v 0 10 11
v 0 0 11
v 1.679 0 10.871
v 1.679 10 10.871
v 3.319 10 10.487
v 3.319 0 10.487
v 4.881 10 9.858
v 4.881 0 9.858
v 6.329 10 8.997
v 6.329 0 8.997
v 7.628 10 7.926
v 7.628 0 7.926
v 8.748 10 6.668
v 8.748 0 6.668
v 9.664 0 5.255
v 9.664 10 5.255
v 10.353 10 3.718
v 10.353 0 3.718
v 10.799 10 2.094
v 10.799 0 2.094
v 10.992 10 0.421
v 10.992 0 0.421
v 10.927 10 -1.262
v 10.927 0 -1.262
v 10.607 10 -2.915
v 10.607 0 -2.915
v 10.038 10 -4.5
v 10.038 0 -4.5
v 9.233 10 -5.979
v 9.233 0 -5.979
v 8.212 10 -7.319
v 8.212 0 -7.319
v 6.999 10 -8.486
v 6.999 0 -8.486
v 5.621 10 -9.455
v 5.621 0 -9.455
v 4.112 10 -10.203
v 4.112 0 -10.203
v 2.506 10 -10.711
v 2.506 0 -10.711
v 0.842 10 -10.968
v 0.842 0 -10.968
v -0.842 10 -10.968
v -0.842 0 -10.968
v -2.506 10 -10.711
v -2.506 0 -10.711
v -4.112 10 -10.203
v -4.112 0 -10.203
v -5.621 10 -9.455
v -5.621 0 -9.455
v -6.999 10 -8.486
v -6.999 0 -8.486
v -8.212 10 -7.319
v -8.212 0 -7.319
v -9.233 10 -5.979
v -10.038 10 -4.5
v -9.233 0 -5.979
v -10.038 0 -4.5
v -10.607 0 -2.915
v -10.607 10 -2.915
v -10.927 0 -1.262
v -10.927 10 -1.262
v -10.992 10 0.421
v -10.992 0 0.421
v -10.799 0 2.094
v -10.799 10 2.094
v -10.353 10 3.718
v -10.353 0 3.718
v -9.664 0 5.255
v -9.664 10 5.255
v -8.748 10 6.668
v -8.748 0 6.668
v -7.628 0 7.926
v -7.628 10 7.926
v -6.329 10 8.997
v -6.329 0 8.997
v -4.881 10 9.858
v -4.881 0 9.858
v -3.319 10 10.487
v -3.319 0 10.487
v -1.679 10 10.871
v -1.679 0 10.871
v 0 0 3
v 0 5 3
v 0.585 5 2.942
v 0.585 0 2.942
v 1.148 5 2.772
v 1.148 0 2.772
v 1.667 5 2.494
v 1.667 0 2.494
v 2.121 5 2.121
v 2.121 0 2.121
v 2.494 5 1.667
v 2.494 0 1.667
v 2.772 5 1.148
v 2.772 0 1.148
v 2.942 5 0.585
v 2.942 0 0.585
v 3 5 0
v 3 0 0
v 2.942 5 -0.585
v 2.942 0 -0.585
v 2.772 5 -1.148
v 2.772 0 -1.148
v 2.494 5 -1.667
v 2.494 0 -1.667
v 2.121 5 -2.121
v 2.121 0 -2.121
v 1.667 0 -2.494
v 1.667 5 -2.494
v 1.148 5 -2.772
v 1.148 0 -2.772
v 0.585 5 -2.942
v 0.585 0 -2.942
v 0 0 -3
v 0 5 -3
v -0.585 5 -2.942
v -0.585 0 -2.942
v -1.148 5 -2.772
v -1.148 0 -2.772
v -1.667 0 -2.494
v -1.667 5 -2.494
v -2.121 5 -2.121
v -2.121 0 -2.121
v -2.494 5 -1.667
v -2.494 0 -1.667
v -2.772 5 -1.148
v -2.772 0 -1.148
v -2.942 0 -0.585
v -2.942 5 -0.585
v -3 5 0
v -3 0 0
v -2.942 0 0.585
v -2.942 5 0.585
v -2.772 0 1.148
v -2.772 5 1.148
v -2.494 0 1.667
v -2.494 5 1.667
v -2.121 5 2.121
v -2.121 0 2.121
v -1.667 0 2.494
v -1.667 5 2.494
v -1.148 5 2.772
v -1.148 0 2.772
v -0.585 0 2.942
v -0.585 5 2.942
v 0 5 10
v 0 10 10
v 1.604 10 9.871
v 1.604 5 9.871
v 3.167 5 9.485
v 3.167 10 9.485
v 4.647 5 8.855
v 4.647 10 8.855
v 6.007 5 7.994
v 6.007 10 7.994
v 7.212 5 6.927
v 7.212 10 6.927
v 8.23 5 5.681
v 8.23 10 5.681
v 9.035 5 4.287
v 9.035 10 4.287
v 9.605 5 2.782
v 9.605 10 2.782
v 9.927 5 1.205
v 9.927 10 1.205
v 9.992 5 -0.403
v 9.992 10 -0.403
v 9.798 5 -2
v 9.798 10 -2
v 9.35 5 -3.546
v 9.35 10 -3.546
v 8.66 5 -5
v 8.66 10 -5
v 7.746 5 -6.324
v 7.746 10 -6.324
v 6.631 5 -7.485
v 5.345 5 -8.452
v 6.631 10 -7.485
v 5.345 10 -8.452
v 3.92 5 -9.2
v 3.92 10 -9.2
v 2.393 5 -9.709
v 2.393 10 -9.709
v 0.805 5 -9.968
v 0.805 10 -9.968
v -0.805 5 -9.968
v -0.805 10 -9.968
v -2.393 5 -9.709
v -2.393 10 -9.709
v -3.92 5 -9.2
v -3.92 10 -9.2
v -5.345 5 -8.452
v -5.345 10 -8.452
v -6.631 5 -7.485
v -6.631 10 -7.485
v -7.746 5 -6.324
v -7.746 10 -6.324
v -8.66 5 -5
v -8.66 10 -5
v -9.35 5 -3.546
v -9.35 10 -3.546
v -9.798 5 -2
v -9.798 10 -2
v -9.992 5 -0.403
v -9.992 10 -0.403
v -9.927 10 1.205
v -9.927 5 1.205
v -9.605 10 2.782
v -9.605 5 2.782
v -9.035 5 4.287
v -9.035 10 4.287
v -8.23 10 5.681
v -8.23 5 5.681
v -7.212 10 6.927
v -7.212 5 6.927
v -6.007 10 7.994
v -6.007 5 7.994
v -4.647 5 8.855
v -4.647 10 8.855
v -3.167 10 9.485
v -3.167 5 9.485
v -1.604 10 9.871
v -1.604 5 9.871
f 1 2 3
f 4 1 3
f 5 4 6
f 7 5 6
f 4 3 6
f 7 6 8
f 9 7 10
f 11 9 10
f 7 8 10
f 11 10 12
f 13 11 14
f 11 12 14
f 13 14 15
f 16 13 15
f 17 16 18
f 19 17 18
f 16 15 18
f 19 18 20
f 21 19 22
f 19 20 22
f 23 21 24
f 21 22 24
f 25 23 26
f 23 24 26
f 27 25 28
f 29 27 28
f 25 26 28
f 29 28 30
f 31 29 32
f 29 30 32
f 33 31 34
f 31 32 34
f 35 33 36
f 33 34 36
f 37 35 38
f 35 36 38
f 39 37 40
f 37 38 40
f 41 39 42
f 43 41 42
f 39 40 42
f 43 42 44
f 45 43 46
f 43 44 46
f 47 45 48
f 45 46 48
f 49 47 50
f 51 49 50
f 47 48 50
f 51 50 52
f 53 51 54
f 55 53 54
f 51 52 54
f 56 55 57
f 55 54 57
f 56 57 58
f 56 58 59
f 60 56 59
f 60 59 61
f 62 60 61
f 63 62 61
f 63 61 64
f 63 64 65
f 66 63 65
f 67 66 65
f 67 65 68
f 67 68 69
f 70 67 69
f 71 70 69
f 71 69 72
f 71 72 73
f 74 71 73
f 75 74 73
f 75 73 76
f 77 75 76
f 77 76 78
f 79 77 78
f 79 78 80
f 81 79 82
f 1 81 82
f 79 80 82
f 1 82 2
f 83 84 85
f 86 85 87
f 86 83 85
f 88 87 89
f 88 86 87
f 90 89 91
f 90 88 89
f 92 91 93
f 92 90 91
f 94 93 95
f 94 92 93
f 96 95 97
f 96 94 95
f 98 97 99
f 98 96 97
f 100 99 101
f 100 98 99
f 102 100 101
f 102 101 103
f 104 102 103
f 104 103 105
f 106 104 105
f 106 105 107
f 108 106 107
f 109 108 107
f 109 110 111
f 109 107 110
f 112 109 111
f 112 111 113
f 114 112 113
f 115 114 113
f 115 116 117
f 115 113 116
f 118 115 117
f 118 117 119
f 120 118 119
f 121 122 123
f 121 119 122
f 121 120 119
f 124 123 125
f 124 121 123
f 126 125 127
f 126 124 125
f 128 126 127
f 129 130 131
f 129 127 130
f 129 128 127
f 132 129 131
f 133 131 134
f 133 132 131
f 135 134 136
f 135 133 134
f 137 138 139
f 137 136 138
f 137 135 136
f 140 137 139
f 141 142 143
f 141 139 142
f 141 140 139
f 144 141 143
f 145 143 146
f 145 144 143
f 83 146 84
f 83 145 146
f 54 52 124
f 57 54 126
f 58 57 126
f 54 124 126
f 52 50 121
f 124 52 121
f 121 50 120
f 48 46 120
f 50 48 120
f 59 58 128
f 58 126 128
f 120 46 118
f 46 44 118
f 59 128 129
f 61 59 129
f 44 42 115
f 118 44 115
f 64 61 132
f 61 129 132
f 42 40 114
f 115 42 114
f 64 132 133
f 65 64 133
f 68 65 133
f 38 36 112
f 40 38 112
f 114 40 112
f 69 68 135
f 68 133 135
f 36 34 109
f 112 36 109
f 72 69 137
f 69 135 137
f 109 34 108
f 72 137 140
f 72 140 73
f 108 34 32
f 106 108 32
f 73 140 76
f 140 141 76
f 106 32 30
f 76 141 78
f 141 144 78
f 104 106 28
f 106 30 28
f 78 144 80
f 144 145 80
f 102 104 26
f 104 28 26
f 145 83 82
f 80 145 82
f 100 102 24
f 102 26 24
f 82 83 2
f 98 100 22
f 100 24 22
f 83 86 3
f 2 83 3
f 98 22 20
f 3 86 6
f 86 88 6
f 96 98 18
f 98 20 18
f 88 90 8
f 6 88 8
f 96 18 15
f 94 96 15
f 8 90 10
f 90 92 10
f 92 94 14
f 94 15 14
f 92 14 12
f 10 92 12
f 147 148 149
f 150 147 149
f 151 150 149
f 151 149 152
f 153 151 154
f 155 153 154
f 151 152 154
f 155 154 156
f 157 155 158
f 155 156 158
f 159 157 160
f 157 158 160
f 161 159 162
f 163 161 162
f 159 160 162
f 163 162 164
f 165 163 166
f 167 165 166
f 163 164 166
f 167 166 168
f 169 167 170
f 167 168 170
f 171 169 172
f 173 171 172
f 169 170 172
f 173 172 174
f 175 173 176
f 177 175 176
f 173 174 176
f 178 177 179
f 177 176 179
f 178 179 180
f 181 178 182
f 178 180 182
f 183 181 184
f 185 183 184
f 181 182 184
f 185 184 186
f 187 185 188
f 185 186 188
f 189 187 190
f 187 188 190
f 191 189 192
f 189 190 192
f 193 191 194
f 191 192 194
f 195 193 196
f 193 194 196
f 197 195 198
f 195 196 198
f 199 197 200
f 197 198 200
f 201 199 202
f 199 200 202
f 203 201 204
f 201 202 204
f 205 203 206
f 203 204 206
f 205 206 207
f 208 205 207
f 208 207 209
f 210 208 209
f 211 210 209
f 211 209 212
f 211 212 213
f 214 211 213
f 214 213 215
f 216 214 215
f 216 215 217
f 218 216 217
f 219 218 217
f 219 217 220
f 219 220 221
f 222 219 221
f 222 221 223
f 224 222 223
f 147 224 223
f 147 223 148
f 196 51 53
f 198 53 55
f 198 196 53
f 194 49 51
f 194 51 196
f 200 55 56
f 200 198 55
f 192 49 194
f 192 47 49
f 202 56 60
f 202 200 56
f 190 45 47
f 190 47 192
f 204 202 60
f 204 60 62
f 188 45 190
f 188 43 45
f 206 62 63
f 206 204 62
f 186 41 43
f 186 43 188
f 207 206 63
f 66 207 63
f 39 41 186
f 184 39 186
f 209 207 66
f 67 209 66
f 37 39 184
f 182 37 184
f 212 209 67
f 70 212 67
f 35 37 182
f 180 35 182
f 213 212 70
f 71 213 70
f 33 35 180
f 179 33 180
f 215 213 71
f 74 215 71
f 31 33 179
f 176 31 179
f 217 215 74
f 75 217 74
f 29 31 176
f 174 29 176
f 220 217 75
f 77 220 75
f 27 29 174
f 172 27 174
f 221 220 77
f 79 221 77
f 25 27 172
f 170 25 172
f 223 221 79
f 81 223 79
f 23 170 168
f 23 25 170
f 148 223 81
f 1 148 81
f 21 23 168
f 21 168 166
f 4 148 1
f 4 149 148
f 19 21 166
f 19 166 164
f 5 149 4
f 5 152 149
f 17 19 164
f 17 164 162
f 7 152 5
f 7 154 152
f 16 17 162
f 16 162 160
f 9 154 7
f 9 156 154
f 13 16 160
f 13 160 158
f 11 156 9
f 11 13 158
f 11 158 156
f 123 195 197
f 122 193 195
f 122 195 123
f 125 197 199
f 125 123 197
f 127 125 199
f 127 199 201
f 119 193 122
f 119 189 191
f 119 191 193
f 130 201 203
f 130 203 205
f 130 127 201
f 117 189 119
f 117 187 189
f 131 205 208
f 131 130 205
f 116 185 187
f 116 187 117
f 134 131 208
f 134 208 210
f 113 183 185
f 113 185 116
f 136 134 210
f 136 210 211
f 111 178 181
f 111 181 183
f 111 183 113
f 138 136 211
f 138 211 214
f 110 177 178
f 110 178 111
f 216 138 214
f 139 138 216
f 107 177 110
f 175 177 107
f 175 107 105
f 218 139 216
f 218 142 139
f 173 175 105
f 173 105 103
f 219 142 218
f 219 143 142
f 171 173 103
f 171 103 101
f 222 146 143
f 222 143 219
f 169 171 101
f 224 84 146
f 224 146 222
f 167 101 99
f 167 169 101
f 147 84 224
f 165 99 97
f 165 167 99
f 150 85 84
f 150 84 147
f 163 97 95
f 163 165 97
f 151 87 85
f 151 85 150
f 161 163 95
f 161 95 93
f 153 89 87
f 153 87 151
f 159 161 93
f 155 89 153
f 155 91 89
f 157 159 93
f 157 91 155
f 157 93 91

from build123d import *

# Parameters (mm, degrees)
SKETCH1_R           = 11
BOSS_EXTRUDE1_DEPTH = 10
SKETCH2_R           = 3
CUT_EXTRUDE1_DEPTH  = 20
SKETCH5_R           = 10
CUT_EXTRUDE3_DEPTH  = 5


with BuildPart() as part:
    # Sketch1 → Boss-Extrude1 (new body)
    with BuildSketch(Plane(origin=(0, 0, 0), x_dir=(1, 0, 0), z_dir=(0, 1, 0))):
        with Locations(Location((0, 0, 0), (0, 0, 270))):
            Circle(SKETCH1_R)
    extrude(amount=BOSS_EXTRUDE1_DEPTH)

    # Sketch2 → Cut-Extrude1 (cut)
    with BuildSketch(Plane(origin=(0, 0, 0), x_dir=(1, 0, 0), z_dir=(0, 1, 0))):
        with Locations(Location((0, 0, 0), (0, 0, 270))):
            Circle(SKETCH2_R)
    extrude(amount=CUT_EXTRUDE1_DEPTH, mode=Mode.SUBTRACT)

    # Sketch5 → Cut-Extrude3 (cut)
    with BuildSketch(Plane(origin=(0, 10, 0), x_dir=(1, 0, 0), z_dir=(0, 1, 0))):
        with Locations(Location((0, 0, 0), (0, 0, 270))):
            Circle(SKETCH5_R)
    extrude(amount=-CUT_EXTRUDE3_DEPTH, mode=Mode.SUBTRACT)


solid = part.part
